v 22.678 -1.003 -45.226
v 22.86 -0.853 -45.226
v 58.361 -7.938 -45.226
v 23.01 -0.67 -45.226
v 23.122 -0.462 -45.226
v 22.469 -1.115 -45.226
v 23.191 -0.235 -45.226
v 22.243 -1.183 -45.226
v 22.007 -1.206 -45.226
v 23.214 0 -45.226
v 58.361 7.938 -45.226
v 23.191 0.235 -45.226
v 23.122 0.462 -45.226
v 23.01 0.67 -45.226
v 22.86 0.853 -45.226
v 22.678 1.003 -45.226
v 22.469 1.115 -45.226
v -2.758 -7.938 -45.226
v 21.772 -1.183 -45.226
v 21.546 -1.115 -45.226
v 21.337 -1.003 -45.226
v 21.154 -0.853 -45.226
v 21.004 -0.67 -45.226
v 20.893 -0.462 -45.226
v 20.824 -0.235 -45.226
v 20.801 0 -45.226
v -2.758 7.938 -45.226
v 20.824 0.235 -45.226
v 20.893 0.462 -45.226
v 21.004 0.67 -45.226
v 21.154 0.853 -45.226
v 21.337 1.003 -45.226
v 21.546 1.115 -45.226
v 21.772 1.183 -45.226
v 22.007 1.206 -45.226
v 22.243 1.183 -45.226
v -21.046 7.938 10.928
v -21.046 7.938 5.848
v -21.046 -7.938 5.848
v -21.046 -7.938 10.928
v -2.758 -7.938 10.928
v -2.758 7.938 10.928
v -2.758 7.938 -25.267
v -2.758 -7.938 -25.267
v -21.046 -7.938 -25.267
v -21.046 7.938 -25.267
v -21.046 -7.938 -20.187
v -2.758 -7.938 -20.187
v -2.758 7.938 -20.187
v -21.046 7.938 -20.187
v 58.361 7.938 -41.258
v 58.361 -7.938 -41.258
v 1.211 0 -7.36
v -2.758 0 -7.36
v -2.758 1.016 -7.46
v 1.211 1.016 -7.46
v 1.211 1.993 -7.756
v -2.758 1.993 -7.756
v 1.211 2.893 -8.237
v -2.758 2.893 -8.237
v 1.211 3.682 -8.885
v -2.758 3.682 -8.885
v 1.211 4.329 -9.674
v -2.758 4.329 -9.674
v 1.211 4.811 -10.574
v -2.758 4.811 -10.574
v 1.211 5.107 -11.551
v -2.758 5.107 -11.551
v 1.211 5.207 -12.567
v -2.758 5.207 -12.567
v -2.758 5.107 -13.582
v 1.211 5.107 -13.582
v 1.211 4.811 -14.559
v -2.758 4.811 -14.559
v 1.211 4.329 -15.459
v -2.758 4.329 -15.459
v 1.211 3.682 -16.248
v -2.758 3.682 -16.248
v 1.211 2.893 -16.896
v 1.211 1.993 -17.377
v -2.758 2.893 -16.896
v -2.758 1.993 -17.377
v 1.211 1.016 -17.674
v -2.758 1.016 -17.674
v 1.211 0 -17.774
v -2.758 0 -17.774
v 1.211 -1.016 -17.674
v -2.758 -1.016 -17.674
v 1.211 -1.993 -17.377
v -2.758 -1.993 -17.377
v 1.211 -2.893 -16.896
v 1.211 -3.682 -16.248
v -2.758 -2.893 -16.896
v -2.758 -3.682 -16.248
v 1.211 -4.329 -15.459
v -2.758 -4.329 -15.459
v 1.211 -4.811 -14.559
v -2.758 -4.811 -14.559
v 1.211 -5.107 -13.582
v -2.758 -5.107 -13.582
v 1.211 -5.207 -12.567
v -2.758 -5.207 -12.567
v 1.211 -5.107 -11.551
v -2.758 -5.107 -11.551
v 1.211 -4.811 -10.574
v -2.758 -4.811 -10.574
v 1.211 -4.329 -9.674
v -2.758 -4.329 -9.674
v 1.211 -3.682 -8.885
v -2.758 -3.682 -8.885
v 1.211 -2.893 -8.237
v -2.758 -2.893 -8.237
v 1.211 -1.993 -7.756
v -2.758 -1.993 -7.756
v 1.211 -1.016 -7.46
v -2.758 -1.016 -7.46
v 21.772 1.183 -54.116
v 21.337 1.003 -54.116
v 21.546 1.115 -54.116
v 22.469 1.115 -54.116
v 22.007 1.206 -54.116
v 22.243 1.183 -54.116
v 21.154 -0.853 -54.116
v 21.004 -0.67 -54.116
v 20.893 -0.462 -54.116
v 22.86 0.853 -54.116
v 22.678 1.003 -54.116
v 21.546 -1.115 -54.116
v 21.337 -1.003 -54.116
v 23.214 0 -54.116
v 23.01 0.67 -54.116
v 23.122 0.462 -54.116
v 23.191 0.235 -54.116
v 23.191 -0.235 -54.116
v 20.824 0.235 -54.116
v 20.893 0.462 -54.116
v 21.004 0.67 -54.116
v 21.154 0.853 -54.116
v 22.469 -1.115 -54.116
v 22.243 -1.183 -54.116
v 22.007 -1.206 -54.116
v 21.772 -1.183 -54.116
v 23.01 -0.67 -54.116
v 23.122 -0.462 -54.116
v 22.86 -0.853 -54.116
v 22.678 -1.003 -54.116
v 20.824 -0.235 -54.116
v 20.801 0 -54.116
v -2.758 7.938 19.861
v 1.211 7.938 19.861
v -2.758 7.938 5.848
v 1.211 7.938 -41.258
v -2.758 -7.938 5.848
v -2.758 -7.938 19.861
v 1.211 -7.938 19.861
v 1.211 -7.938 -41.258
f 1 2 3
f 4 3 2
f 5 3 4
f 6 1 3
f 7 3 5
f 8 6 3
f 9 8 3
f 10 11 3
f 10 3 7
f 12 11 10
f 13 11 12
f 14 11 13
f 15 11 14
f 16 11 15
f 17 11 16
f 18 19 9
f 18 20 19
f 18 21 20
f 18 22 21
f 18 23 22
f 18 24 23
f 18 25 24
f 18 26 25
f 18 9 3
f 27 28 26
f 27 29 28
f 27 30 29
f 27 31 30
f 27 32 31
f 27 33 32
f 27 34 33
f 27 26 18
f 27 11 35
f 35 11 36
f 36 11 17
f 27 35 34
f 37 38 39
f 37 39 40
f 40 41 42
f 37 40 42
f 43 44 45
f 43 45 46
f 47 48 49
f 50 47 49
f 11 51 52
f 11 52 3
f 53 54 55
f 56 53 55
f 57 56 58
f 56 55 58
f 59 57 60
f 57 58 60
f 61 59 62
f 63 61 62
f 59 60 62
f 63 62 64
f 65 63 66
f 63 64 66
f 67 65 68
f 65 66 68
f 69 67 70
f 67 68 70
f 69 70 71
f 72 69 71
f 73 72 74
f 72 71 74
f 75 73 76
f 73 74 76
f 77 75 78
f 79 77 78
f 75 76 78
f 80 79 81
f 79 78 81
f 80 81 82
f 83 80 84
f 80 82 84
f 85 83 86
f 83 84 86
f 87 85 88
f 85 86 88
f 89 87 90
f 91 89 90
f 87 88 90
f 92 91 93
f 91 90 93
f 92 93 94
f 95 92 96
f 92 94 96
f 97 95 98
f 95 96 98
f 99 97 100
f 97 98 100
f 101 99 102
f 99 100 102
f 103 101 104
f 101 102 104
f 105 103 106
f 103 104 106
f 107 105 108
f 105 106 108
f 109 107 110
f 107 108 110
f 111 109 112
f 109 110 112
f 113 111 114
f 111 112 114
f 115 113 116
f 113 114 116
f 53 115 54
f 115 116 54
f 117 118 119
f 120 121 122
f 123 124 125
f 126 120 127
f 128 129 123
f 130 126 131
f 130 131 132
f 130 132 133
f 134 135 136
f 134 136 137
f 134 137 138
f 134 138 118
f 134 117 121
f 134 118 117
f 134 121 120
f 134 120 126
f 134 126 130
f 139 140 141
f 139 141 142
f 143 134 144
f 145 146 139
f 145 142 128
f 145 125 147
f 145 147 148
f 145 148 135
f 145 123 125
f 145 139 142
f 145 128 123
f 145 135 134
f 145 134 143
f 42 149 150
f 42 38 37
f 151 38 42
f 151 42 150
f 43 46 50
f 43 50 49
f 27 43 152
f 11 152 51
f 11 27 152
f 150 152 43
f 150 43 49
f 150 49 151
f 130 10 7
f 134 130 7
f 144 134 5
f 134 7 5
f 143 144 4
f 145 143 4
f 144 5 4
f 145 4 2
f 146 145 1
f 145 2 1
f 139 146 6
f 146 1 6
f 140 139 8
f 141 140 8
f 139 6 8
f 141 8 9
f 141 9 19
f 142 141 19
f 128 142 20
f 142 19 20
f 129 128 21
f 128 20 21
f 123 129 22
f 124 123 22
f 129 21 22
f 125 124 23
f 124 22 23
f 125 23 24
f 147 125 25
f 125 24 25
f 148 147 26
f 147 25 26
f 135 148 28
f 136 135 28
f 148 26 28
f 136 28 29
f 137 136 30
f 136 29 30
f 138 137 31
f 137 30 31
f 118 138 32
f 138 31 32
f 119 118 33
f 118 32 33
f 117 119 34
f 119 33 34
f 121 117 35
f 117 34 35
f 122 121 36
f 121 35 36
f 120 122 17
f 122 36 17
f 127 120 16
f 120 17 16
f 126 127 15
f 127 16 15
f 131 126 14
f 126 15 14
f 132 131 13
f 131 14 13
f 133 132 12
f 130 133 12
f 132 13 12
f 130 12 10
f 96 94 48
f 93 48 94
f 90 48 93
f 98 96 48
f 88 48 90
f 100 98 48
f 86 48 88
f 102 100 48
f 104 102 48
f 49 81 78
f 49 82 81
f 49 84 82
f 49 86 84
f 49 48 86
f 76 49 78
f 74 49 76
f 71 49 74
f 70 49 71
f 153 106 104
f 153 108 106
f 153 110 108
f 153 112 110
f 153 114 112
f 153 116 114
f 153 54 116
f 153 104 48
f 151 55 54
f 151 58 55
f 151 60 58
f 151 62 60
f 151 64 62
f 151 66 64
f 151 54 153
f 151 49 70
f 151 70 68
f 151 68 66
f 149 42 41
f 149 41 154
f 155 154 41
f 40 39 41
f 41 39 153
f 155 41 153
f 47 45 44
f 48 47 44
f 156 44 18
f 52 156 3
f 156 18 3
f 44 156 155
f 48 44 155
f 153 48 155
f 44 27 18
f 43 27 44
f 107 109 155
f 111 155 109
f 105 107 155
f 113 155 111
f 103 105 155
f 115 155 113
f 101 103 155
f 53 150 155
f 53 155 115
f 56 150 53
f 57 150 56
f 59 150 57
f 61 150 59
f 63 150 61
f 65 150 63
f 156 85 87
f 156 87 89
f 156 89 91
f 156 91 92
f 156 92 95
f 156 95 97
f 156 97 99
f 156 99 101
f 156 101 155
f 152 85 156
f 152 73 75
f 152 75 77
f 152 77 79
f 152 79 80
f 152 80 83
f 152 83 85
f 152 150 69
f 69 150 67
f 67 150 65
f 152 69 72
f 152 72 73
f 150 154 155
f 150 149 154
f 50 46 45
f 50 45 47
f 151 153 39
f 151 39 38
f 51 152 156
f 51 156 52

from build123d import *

# Parameters (mm, degrees)
BOSS_EXTRUDE1_DEPTH = 7.9375
SKETCH3_R           = 5.207
CUT_EXTRUDE1_DEPTH  = 3.96875
SKETCH4_R           = 1.2065
BOSS_EXTRUDE2_DEPTH = 8.89
SKETCH5_W           = 5.08
SKETCH5_H           = 15.875
BOSS_EXTRUDE3_DEPTH = 18.288


with BuildPart() as part:
    # Sketch1 → Boss-Extrude1 (new, symmetric)
    with BuildSketch(Plane(origin=(0, 0, 0), x_dir=(1, 0, 0), z_dir=(0, 1, 0))):
        Polygon((-2.757708096, -19.86108723), (1.211041904, -19.86108723), (1.211041904, 41.25766277), (58.361041904, 41.25766277), (58.361041904, 45.22641277), (6.27967861, 45.22641277), (-2.757708096, 45.22641277), align=None)
    extrude(amount=BOSS_EXTRUDE1_DEPTH, both=True)

    # Sketch3 → Cut-Extrude1 (cut)
    with BuildSketch(Plane.ZY.offset(2.757708096)):
        with Locations((-12.566559842, 0)):
            Circle(SKETCH3_R)
    extrude(amount=-CUT_EXTRUDE1_DEPTH, mode=Mode.SUBTRACT)

    # Sketch4 → Boss-Extrude2 (add)
    with BuildSketch(Plane(origin=(0, 0, -45.22641277), x_dir=(-1, 0, 0), z_dir=(0, 0, -1))):
        with Locations(Location((-22.007291904, 0, 0), (0, 0, 180))):
            Circle(SKETCH4_R)
    extrude(amount=BOSS_EXTRUDE2_DEPTH)

    # Sketch5 → Boss-Extrude3 (add)
    with BuildSketch(Plane.ZY.offset(2.757708096)):
        with Locations((-22.726559842, 0)):
            Rectangle(SKETCH5_W, SKETCH5_H)
        with Locations((8.388440158, 0)):
            Rectangle(SKETCH5_W, SKETCH5_H)
    extrude(amount=BOSS_EXTRUDE3_DEPTH)


solid = part.part
